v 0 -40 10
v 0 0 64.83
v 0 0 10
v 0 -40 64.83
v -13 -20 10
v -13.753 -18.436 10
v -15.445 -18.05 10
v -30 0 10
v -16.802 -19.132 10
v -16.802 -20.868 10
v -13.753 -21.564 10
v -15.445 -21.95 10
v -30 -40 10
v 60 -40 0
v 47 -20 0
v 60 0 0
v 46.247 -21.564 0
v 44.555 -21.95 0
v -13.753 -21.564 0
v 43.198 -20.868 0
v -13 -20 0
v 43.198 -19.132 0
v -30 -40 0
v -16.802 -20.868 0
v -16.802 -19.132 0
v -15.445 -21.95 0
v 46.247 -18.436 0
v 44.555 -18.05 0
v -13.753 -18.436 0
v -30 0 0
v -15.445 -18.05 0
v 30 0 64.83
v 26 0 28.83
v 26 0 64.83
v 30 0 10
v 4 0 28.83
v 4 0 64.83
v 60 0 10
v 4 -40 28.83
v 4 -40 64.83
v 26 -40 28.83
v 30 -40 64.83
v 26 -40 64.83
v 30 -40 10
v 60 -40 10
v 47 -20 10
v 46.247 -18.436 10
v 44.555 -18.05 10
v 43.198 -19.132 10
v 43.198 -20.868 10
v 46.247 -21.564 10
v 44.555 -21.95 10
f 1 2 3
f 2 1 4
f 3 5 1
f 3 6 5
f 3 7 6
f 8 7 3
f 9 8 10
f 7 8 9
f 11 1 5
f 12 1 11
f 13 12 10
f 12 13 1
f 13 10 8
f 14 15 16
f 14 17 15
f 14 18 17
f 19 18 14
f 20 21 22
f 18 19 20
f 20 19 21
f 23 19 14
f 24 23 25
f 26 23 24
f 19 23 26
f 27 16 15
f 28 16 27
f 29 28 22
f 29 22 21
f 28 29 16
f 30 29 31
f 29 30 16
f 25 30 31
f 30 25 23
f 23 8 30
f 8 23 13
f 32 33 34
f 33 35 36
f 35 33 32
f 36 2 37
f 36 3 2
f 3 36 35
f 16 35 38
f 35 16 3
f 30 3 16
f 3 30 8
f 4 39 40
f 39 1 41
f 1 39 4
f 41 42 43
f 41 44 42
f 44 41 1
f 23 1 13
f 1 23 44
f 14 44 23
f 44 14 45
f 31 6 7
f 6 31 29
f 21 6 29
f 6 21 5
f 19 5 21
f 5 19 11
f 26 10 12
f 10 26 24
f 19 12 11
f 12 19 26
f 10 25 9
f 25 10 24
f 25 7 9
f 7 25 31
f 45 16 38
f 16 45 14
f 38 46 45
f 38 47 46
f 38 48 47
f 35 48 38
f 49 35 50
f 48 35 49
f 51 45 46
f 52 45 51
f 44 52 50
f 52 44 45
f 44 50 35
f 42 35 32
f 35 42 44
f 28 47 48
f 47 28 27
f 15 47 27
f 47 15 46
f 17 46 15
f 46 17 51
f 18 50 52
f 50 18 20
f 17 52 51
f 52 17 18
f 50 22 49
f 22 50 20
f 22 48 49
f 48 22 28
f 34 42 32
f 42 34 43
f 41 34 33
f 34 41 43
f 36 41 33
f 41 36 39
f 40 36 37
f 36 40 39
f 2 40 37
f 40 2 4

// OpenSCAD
// file: fixation.scad
module fixation() {
    difference(){
        translate([-30,-40,0])
            cube([30,40,10]);
        translate([-15,-20,-1])
            cylinder(20,2,2);
        
    }
    difference(){
        translate([30,-40,0])
            cube([30,40,10]);
        translate([45,-20,-1])
            cylinder(20,2,2);
    }
   
}
// main file
include <fixation.scad>

rotate([90,0,0])
    linear_extrude (height=40, $fn = 200)
        import (file="clips.dxf", layer="5", $fn=200);

fixation();
